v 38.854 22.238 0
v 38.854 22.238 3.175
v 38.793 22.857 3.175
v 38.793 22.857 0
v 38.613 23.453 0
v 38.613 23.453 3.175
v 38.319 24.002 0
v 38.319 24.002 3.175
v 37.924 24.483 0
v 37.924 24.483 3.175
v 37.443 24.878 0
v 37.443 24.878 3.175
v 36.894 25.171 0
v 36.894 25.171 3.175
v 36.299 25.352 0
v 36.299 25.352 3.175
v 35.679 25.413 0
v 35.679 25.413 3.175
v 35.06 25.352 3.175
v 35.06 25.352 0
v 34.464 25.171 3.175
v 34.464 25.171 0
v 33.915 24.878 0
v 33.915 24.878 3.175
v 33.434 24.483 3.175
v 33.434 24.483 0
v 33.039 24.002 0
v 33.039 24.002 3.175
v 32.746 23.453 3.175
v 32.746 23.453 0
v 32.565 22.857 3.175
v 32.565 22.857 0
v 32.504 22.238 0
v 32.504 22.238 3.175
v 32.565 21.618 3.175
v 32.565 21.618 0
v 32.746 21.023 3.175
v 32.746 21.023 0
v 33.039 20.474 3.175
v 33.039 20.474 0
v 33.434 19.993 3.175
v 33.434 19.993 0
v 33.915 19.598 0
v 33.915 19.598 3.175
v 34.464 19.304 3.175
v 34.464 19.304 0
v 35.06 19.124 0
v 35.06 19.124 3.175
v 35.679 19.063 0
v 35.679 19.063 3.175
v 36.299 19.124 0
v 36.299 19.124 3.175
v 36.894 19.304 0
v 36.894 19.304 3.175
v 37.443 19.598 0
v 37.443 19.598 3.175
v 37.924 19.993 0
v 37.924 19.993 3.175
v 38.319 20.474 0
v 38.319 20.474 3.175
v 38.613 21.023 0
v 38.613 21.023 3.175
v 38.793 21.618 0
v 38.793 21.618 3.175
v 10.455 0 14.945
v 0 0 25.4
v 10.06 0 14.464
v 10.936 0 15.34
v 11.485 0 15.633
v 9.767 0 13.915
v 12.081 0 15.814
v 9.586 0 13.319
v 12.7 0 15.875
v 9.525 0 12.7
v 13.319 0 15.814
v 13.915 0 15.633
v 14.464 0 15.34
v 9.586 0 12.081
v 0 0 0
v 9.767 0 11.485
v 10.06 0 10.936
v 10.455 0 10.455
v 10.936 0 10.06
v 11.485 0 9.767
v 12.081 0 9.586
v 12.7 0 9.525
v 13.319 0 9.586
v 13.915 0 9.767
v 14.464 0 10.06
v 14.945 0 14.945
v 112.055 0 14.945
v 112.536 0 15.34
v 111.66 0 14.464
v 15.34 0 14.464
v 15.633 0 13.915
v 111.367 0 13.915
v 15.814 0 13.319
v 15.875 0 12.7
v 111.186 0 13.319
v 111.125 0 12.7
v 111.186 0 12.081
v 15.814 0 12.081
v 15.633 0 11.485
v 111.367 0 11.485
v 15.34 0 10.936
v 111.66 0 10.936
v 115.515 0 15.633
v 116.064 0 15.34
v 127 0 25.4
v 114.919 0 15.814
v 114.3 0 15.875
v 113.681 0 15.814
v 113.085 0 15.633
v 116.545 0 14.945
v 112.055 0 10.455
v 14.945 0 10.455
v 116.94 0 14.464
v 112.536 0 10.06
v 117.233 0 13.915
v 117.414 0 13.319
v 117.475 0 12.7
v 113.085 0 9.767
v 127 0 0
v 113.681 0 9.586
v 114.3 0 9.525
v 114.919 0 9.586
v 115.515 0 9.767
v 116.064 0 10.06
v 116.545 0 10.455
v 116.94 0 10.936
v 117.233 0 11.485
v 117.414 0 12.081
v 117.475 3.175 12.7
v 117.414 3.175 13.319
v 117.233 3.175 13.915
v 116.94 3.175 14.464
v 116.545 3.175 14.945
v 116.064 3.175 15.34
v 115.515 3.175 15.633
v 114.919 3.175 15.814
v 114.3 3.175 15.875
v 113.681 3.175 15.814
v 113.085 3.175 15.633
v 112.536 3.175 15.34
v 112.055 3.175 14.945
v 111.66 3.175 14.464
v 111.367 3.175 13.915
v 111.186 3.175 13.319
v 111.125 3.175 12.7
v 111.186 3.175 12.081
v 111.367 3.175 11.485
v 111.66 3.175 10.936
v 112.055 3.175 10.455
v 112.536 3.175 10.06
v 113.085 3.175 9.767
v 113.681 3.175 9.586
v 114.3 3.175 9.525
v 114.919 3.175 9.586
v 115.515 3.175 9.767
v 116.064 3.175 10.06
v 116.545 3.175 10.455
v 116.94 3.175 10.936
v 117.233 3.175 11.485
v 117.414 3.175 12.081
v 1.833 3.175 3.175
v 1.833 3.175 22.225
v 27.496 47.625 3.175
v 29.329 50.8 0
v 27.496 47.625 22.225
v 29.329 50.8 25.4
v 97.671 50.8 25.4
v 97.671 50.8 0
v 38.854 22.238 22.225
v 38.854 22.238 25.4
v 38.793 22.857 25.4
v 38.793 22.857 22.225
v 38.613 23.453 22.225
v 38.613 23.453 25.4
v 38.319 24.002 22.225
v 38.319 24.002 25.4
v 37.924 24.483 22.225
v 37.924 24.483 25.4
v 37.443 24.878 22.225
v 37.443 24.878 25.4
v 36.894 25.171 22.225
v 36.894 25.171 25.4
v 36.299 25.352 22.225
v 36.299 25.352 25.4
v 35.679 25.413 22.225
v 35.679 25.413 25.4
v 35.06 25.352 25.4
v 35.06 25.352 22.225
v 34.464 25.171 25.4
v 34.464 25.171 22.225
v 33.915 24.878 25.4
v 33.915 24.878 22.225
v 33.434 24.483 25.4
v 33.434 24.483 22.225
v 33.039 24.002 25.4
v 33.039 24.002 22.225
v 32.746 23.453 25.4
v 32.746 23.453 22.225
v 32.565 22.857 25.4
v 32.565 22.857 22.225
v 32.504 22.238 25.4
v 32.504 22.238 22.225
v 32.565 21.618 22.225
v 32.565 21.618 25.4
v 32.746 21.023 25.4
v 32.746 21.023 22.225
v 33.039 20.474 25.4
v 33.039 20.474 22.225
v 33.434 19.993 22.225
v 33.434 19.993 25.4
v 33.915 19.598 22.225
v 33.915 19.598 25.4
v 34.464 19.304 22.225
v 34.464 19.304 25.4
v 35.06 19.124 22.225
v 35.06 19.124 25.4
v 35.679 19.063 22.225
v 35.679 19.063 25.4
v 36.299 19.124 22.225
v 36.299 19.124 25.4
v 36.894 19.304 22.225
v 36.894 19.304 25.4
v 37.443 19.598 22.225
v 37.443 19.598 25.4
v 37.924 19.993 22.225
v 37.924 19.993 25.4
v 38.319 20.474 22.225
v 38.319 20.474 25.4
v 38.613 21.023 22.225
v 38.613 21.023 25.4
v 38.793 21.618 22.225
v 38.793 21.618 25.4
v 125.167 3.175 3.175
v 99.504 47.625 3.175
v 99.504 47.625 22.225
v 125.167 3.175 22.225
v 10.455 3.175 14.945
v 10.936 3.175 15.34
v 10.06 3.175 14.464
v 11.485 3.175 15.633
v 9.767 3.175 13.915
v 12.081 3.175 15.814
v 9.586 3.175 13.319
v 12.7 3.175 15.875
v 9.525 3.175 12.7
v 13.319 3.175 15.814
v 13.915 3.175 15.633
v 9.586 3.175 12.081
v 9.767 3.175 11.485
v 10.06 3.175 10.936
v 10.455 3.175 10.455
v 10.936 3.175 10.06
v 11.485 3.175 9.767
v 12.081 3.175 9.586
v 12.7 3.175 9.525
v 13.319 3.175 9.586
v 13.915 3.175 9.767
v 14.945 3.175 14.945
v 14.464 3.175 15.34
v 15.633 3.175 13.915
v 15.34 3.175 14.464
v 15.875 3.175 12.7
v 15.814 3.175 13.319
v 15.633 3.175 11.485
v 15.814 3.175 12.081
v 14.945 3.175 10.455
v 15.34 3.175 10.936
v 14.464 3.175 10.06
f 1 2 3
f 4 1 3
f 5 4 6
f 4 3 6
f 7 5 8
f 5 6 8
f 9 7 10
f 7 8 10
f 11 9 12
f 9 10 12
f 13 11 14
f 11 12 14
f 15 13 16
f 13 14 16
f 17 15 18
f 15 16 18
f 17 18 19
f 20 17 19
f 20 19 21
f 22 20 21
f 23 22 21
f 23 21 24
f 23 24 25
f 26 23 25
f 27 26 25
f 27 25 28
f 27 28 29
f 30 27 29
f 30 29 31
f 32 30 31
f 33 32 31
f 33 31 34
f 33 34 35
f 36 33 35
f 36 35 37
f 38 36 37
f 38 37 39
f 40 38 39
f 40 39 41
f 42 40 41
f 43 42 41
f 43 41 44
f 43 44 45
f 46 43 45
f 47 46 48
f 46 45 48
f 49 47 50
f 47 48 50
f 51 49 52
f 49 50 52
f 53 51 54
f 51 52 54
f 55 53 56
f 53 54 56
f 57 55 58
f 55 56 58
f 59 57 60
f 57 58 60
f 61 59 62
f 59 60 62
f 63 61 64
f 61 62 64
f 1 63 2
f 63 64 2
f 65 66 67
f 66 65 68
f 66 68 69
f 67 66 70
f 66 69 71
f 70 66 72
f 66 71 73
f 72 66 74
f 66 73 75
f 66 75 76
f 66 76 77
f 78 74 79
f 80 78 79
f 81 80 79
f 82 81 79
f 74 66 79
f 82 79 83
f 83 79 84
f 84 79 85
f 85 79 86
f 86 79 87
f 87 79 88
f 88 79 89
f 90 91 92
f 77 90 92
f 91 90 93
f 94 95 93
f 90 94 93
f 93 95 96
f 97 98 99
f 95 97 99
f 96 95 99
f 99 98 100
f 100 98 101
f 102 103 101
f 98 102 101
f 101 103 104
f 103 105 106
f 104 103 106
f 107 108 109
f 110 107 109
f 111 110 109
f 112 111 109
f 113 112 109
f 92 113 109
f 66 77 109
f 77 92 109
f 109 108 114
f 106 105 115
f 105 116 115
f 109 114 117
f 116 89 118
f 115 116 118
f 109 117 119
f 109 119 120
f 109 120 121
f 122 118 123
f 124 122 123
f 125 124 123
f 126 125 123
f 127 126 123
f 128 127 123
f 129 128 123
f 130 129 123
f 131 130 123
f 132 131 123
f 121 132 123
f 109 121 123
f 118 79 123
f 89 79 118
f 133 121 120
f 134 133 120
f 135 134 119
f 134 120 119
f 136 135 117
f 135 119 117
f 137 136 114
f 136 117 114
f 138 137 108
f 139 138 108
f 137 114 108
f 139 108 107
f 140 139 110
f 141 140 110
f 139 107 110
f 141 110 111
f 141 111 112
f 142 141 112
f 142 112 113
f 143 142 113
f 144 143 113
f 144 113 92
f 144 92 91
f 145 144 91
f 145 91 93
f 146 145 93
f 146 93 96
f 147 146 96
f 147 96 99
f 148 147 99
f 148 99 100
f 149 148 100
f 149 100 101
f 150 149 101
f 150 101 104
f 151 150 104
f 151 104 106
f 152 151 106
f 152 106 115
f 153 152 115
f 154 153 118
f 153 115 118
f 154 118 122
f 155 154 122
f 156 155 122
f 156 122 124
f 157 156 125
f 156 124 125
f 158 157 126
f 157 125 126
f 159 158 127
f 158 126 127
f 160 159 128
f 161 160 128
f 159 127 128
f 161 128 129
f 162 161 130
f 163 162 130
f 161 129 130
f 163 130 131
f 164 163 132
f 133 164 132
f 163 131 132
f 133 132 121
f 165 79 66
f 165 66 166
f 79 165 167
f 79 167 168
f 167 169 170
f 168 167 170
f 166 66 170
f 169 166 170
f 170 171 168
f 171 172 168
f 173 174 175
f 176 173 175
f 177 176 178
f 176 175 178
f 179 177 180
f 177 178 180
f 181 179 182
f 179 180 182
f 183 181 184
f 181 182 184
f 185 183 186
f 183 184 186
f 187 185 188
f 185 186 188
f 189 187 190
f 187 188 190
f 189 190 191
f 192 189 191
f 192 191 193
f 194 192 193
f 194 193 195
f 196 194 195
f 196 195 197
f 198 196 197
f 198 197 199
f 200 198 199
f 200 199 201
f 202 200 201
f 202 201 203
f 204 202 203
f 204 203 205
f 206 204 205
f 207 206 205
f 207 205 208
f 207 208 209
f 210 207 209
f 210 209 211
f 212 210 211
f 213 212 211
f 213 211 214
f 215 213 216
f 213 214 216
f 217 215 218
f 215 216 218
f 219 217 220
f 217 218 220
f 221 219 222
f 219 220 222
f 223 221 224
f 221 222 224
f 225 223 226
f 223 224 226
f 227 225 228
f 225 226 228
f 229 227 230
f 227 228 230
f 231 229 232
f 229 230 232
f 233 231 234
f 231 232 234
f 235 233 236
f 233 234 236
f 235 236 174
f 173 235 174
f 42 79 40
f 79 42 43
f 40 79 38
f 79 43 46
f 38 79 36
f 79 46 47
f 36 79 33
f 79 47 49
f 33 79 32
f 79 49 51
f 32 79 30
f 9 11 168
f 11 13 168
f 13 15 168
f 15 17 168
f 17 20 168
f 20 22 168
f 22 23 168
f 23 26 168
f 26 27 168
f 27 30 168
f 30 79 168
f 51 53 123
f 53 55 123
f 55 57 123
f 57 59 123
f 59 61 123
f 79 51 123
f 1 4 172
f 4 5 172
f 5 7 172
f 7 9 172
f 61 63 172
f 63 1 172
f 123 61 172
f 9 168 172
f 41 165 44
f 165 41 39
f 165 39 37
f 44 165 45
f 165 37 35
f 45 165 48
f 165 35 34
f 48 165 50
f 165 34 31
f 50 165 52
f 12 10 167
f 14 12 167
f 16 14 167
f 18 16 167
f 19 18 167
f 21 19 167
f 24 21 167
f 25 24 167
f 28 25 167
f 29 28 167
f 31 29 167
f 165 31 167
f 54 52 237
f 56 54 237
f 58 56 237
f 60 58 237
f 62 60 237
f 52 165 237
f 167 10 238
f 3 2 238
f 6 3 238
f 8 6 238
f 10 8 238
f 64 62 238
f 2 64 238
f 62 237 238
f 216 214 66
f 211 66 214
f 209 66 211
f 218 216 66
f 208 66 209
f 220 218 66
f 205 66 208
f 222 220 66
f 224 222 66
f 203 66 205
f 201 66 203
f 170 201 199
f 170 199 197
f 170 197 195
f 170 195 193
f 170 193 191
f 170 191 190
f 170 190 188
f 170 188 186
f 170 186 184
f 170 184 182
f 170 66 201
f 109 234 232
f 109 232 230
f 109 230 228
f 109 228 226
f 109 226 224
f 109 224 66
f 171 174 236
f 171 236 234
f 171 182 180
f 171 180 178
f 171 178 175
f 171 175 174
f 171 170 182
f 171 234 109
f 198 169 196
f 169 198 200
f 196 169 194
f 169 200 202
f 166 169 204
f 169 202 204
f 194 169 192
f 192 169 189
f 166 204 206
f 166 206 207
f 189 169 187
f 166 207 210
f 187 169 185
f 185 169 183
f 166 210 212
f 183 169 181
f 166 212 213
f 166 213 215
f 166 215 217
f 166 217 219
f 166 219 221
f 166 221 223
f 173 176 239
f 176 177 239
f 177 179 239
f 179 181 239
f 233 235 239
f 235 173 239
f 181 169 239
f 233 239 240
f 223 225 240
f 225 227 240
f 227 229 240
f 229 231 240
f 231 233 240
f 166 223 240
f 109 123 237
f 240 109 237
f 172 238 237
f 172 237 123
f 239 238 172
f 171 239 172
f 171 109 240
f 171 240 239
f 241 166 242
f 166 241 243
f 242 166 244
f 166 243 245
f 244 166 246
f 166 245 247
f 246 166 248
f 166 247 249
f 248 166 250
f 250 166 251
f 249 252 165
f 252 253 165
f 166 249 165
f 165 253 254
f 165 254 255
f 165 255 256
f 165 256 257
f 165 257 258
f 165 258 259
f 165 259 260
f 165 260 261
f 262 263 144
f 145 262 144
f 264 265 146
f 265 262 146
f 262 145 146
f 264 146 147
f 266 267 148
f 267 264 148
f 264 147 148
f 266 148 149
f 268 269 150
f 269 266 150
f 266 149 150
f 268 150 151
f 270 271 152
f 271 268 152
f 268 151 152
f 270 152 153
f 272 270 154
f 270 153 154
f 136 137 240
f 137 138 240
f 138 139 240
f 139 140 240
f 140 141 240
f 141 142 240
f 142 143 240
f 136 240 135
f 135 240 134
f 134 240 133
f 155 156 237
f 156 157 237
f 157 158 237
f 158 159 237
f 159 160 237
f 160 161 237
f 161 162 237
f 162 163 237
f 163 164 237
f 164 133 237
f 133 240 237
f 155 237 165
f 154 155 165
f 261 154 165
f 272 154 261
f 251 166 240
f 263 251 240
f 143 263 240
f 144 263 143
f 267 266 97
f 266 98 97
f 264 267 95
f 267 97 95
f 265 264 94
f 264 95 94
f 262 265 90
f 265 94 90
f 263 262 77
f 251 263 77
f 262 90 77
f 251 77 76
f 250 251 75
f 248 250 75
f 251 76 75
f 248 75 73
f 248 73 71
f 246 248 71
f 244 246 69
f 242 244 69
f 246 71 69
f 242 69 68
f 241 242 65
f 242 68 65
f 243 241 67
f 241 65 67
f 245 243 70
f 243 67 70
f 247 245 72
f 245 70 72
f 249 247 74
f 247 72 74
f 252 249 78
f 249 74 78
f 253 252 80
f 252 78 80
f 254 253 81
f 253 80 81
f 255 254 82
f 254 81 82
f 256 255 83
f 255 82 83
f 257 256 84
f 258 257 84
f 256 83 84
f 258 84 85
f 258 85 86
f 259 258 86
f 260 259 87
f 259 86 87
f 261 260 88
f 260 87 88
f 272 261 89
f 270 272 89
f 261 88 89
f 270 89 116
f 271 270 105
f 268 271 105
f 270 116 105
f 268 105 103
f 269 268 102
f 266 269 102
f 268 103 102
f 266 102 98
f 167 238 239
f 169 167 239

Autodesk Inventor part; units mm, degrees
ref_plane "YZ Plane" through (0, 0, 0) normal (1, 0, 0) x (0, 1, 0)
ref_plane "XZ Plane" through (0, 0, 0) normal (0, 1, 0) x (-1, 0, 0)
ref_plane "XY Plane" through (0, 0, 0) normal (0, 0, 1) x (1, 0, 0)
sketch "Sketch1" plane through (0, 0, 0) normal (0, 0, 1) x (1, 0, 0)
  line L0 (0, 0) -> (127, 0)
  line L1 (127, 0) -> (127, 50.8)
  line L2 (127, 50.8) -> (0, 50.8)
  line L3 (0, 50.8) -> (0, 0)
  dimension "d0" = 127
  dimension "d1" = 50.8
extrude "Extrusion1" add sketch "Sketch1" along normal blind 25.4
sketch "Sketch2" plane through (127, 0, 0) normal (1, 0, 0) x (0, 0, -1)
  line L0 (-22.225, 3.175) -> (-3.175, 3.175)
  line L1 (-3.175, 3.175) -> (-3.175, 47.625)
  line L2 (-3.175, 47.625) -> (-22.225, 47.625)
  line L3 (-22.225, 47.625) -> (-22.225, 3.175)
  dimension "d4" = 19.05
  dimension "d5" = 44.45
extrude "Extrusion2" cut sketch "Sketch2" against normal blind 2514.6
sketch "Sketch3" plane through (0, 0, 25.4) normal (0, 0, 1) x (1, 0, 0)
  line L0 (127, 0) -> (127, 50.8) projected
  line L1 (127, 50.8) -> (0, 50.8) projected
  line L2 (0, 50.8) -> (0, 0) projected
  line L3 (0, 0) -> (29.3294, 50.8)
  line L4 (0, 0) -> (58.6588, 0) construction
  line L5 (127, 0) -> (97.6706, 50.8)
  line L6 (127, 0) -> (185.6588, 0) construction
  dimension "d8" = 60
  dimension "d9" = 120
extrude "Extrusion3" cut sketch "Sketch3" against normal blind 2514.6
sketch "Sketch4" plane through (0, 0, 0) normal (0, -1, 0) x (1, 0, 0)
  circle A0 centre (12.7, 12.7) radius 3.175
  circle A1 centre (114.3, 12.7) radius 3.175
  dimension "d12" = 6.35
  dimension "d13" = 6.35
extrude "Extrusion4" cut sketch "Sketch4" against normal blind 2514.6
sketch "Sketch5" plane through (0, 0, 25.4) normal (0, 0, 1) x (1, 0, 0)
  line L0 (0, 0) -> (127, 0) projected
  line L1 (29.3294, 50.8) -> (97.6706, 50.8)
  line L2 (97.6706, 50.8) -> (97.6706, 0)
  line L3 (97.6706, 0) -> (29.3294, 0)
  line L4 (29.3294, 0) -> (29.3294, 50.8)
  line L5 (29.3294, 0) -> (35.6794, 0)
  line L6 (35.6794, 0) -> (35.6794, 22.2377)
  line L7 (35.6794, 22.2377) -> (97.6706, 22.2377)
  line L8 (97.6706, 22.2377) -> (84.9706, 22.2377)
  circle A0 centre (35.6794, 22.2377) radius 3.175
  dimension "d16" = 6.35
  dimension "d17" = 22.2377
  dimension "d18" = 90
  dimension "d19" = 12.7
  dimension "d20" = 6.35
extrude "Extrusion5" cut sketch "Sketch5" against normal blind 2514.6 contours A0 L7 L6 | L6 L7 A0
properties part number "MotorSupport"
